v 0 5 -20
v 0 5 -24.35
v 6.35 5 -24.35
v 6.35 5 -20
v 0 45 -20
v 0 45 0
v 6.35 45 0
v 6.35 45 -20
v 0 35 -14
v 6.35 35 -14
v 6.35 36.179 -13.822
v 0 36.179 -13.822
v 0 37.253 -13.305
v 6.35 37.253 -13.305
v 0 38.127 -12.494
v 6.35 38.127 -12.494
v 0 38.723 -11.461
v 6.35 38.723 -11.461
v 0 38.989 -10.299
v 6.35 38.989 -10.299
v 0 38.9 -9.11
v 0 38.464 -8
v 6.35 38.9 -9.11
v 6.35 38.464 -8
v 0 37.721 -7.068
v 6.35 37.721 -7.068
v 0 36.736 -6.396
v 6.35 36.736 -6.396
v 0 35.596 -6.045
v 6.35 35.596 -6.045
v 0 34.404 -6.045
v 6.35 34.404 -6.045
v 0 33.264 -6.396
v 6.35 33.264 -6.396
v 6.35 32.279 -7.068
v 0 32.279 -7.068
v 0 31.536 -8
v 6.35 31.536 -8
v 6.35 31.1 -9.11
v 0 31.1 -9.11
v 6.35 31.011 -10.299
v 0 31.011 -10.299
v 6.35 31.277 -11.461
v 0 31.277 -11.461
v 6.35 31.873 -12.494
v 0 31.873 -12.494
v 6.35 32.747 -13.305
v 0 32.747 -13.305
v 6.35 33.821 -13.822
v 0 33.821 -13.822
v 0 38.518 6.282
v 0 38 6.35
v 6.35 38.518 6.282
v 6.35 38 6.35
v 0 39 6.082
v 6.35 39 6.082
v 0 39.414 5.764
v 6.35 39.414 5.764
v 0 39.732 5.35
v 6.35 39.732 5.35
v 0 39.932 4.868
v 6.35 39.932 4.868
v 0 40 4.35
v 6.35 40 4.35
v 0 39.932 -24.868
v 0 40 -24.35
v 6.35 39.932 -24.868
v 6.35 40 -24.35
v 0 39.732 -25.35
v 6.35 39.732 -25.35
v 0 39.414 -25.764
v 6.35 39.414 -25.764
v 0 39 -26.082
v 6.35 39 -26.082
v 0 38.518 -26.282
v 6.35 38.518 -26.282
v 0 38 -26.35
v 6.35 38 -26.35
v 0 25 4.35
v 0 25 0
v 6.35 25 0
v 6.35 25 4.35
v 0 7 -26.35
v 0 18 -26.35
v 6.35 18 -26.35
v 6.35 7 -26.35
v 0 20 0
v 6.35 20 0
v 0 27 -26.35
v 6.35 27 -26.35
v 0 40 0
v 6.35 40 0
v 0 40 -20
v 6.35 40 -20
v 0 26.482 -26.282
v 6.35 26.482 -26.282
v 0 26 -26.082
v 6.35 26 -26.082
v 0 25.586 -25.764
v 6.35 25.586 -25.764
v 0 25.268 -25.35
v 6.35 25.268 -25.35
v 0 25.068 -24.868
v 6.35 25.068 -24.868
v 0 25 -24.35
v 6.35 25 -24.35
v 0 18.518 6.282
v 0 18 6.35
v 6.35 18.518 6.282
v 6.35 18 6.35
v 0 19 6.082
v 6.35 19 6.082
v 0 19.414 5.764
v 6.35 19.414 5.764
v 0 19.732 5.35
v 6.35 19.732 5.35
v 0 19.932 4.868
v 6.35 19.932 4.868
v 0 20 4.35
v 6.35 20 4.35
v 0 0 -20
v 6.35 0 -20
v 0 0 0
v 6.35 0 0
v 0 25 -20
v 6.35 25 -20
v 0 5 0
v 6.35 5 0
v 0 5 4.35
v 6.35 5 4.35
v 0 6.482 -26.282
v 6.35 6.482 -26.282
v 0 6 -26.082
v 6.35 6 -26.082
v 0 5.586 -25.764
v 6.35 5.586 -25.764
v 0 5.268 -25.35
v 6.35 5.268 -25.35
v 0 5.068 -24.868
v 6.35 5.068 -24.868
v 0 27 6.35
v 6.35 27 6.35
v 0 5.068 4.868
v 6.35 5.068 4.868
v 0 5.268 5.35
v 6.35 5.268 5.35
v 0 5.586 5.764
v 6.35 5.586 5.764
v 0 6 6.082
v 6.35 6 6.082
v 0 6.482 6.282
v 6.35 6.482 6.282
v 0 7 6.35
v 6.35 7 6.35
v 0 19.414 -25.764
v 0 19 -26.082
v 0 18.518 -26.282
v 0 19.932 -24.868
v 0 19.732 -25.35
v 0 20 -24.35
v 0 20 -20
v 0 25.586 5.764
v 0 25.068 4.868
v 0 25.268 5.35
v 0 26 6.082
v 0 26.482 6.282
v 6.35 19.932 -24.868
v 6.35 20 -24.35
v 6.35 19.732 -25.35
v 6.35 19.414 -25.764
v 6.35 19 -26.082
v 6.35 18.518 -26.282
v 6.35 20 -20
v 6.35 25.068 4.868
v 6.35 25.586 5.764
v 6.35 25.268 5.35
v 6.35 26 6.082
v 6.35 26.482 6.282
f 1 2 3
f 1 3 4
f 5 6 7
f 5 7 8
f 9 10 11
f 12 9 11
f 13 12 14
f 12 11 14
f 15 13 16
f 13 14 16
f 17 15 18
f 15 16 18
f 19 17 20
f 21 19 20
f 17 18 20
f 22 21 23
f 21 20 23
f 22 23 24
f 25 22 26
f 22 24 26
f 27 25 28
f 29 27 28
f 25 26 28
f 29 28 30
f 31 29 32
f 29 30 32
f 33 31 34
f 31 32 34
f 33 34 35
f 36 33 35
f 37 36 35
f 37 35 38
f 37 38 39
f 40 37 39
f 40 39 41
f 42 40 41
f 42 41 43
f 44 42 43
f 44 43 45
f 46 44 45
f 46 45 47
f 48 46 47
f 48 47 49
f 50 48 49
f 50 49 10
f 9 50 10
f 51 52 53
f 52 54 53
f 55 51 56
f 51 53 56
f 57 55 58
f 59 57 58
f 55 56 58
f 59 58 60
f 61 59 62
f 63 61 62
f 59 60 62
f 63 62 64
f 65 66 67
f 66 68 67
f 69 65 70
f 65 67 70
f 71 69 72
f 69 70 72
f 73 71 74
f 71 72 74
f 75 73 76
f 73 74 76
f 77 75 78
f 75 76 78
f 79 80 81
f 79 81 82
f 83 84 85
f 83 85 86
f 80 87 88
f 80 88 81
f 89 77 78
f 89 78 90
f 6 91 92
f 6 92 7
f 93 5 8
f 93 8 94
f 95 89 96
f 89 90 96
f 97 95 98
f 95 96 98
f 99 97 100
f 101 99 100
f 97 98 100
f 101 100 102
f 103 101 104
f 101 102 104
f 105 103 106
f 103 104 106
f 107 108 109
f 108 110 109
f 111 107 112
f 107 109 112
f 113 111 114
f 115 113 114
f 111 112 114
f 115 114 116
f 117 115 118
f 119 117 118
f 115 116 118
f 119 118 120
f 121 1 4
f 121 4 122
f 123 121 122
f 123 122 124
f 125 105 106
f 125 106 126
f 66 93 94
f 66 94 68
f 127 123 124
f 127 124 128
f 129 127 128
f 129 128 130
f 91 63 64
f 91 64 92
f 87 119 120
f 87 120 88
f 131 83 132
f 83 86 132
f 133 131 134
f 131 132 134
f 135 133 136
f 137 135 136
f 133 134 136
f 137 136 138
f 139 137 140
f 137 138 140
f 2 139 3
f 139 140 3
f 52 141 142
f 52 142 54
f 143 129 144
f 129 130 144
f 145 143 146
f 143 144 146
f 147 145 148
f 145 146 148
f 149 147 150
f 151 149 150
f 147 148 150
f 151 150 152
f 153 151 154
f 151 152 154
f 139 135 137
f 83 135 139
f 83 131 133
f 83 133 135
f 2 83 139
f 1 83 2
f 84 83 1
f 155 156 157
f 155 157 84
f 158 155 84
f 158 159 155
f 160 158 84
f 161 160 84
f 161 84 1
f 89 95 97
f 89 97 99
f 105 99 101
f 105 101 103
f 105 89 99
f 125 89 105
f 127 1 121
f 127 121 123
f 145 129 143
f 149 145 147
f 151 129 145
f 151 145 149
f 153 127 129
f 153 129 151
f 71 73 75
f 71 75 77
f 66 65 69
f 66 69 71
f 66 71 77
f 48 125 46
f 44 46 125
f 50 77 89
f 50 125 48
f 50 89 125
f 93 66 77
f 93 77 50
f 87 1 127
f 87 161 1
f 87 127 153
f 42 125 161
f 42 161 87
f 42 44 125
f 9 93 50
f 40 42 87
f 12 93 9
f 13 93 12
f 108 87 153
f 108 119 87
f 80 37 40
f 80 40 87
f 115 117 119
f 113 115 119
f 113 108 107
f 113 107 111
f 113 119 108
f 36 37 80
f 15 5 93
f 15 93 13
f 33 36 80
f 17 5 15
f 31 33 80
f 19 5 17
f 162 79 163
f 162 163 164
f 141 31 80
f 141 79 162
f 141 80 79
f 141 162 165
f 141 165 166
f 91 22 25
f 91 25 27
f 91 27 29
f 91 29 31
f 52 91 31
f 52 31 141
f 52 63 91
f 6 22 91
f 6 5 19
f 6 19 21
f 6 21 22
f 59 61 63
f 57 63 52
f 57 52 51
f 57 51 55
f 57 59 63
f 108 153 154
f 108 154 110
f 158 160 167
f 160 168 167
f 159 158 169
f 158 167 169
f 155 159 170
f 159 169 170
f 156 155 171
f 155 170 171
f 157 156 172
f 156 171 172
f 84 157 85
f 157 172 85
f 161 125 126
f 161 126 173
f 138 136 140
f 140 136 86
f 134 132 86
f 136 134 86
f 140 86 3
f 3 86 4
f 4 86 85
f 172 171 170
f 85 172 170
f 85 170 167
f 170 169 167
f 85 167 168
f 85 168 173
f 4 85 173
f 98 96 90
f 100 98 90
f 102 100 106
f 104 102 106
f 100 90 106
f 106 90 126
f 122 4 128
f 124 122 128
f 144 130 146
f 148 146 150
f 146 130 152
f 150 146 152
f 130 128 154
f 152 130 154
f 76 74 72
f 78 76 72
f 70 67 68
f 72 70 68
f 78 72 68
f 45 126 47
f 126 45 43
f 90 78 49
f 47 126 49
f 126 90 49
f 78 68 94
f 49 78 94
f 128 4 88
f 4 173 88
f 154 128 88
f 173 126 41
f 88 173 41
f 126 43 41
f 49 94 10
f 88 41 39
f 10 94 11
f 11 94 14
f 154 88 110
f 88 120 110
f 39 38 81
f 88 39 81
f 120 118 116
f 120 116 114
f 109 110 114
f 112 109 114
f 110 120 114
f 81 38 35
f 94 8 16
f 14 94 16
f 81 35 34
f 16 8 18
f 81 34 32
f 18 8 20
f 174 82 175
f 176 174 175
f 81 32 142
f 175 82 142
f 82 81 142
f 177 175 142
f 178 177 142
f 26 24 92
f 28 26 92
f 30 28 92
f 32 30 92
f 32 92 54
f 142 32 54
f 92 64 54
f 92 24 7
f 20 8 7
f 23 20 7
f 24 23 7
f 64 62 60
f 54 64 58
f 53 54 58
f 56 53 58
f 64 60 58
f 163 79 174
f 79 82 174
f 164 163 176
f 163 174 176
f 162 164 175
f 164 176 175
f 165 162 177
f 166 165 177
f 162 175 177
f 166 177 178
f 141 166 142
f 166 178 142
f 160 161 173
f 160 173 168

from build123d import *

# Parameters (mm, degrees)
BOSS_EXTRUDE1_DEPTH = 6.35
FILLET1_R           = 2
SKETCH2_R           = 4
CUT_EXTRUDE1_DEPTH  = 53.532323383


with BuildPart() as part:
    # Sketch1 → Boss-Extrude1 (new body)
    with BuildSketch(Plane(origin=(0, 0, 0), x_dir=(0, 0, -1), z_dir=(1, 0, 0))):
        Polygon((0, 40), (0, 45), (20, 45), (20, 40), (26.35, 40), (26.35, 25), (20, 25), (20, 20), (26.35, 20), (26.35, 5), (20, 5), (20, 0), (0, 0), (0, 5), (-6.35, 5), (-6.35, 20), (0, 20), (0, 25), (-6.35, 25), (-6.35, 40), align=None)
    extrude(amount=BOSS_EXTRUDE1_DEPTH)

    # Fillet1
    fillet1_edges = [part.edges().sort_by_distance(p)[0] for p in [
        (3.175, 5, 6.35),
        (3.175, 20, 6.35),
        (3.175, 25, 6.35),
        (3.175, 40, 6.35),
        (3.175, 40, -26.35),
        (3.175, 25, -26.35),
        (3.175, 20, -26.35),
        (3.175, 5, -26.35),
    ]]
    fillet(fillet1_edges, radius=FILLET1_R)

    # Sketch2 → Cut-Extrude1 (cut, through all)
    with BuildSketch(Plane(origin=(6.35, 0, 0), x_dir=(0, 0, -1), z_dir=(1, 0, 0))):
        with Locations((10, 35)):
            Circle(SKETCH2_R)
    extrude(amount=-CUT_EXTRUDE1_DEPTH, mode=Mode.SUBTRACT)


solid = part.part
